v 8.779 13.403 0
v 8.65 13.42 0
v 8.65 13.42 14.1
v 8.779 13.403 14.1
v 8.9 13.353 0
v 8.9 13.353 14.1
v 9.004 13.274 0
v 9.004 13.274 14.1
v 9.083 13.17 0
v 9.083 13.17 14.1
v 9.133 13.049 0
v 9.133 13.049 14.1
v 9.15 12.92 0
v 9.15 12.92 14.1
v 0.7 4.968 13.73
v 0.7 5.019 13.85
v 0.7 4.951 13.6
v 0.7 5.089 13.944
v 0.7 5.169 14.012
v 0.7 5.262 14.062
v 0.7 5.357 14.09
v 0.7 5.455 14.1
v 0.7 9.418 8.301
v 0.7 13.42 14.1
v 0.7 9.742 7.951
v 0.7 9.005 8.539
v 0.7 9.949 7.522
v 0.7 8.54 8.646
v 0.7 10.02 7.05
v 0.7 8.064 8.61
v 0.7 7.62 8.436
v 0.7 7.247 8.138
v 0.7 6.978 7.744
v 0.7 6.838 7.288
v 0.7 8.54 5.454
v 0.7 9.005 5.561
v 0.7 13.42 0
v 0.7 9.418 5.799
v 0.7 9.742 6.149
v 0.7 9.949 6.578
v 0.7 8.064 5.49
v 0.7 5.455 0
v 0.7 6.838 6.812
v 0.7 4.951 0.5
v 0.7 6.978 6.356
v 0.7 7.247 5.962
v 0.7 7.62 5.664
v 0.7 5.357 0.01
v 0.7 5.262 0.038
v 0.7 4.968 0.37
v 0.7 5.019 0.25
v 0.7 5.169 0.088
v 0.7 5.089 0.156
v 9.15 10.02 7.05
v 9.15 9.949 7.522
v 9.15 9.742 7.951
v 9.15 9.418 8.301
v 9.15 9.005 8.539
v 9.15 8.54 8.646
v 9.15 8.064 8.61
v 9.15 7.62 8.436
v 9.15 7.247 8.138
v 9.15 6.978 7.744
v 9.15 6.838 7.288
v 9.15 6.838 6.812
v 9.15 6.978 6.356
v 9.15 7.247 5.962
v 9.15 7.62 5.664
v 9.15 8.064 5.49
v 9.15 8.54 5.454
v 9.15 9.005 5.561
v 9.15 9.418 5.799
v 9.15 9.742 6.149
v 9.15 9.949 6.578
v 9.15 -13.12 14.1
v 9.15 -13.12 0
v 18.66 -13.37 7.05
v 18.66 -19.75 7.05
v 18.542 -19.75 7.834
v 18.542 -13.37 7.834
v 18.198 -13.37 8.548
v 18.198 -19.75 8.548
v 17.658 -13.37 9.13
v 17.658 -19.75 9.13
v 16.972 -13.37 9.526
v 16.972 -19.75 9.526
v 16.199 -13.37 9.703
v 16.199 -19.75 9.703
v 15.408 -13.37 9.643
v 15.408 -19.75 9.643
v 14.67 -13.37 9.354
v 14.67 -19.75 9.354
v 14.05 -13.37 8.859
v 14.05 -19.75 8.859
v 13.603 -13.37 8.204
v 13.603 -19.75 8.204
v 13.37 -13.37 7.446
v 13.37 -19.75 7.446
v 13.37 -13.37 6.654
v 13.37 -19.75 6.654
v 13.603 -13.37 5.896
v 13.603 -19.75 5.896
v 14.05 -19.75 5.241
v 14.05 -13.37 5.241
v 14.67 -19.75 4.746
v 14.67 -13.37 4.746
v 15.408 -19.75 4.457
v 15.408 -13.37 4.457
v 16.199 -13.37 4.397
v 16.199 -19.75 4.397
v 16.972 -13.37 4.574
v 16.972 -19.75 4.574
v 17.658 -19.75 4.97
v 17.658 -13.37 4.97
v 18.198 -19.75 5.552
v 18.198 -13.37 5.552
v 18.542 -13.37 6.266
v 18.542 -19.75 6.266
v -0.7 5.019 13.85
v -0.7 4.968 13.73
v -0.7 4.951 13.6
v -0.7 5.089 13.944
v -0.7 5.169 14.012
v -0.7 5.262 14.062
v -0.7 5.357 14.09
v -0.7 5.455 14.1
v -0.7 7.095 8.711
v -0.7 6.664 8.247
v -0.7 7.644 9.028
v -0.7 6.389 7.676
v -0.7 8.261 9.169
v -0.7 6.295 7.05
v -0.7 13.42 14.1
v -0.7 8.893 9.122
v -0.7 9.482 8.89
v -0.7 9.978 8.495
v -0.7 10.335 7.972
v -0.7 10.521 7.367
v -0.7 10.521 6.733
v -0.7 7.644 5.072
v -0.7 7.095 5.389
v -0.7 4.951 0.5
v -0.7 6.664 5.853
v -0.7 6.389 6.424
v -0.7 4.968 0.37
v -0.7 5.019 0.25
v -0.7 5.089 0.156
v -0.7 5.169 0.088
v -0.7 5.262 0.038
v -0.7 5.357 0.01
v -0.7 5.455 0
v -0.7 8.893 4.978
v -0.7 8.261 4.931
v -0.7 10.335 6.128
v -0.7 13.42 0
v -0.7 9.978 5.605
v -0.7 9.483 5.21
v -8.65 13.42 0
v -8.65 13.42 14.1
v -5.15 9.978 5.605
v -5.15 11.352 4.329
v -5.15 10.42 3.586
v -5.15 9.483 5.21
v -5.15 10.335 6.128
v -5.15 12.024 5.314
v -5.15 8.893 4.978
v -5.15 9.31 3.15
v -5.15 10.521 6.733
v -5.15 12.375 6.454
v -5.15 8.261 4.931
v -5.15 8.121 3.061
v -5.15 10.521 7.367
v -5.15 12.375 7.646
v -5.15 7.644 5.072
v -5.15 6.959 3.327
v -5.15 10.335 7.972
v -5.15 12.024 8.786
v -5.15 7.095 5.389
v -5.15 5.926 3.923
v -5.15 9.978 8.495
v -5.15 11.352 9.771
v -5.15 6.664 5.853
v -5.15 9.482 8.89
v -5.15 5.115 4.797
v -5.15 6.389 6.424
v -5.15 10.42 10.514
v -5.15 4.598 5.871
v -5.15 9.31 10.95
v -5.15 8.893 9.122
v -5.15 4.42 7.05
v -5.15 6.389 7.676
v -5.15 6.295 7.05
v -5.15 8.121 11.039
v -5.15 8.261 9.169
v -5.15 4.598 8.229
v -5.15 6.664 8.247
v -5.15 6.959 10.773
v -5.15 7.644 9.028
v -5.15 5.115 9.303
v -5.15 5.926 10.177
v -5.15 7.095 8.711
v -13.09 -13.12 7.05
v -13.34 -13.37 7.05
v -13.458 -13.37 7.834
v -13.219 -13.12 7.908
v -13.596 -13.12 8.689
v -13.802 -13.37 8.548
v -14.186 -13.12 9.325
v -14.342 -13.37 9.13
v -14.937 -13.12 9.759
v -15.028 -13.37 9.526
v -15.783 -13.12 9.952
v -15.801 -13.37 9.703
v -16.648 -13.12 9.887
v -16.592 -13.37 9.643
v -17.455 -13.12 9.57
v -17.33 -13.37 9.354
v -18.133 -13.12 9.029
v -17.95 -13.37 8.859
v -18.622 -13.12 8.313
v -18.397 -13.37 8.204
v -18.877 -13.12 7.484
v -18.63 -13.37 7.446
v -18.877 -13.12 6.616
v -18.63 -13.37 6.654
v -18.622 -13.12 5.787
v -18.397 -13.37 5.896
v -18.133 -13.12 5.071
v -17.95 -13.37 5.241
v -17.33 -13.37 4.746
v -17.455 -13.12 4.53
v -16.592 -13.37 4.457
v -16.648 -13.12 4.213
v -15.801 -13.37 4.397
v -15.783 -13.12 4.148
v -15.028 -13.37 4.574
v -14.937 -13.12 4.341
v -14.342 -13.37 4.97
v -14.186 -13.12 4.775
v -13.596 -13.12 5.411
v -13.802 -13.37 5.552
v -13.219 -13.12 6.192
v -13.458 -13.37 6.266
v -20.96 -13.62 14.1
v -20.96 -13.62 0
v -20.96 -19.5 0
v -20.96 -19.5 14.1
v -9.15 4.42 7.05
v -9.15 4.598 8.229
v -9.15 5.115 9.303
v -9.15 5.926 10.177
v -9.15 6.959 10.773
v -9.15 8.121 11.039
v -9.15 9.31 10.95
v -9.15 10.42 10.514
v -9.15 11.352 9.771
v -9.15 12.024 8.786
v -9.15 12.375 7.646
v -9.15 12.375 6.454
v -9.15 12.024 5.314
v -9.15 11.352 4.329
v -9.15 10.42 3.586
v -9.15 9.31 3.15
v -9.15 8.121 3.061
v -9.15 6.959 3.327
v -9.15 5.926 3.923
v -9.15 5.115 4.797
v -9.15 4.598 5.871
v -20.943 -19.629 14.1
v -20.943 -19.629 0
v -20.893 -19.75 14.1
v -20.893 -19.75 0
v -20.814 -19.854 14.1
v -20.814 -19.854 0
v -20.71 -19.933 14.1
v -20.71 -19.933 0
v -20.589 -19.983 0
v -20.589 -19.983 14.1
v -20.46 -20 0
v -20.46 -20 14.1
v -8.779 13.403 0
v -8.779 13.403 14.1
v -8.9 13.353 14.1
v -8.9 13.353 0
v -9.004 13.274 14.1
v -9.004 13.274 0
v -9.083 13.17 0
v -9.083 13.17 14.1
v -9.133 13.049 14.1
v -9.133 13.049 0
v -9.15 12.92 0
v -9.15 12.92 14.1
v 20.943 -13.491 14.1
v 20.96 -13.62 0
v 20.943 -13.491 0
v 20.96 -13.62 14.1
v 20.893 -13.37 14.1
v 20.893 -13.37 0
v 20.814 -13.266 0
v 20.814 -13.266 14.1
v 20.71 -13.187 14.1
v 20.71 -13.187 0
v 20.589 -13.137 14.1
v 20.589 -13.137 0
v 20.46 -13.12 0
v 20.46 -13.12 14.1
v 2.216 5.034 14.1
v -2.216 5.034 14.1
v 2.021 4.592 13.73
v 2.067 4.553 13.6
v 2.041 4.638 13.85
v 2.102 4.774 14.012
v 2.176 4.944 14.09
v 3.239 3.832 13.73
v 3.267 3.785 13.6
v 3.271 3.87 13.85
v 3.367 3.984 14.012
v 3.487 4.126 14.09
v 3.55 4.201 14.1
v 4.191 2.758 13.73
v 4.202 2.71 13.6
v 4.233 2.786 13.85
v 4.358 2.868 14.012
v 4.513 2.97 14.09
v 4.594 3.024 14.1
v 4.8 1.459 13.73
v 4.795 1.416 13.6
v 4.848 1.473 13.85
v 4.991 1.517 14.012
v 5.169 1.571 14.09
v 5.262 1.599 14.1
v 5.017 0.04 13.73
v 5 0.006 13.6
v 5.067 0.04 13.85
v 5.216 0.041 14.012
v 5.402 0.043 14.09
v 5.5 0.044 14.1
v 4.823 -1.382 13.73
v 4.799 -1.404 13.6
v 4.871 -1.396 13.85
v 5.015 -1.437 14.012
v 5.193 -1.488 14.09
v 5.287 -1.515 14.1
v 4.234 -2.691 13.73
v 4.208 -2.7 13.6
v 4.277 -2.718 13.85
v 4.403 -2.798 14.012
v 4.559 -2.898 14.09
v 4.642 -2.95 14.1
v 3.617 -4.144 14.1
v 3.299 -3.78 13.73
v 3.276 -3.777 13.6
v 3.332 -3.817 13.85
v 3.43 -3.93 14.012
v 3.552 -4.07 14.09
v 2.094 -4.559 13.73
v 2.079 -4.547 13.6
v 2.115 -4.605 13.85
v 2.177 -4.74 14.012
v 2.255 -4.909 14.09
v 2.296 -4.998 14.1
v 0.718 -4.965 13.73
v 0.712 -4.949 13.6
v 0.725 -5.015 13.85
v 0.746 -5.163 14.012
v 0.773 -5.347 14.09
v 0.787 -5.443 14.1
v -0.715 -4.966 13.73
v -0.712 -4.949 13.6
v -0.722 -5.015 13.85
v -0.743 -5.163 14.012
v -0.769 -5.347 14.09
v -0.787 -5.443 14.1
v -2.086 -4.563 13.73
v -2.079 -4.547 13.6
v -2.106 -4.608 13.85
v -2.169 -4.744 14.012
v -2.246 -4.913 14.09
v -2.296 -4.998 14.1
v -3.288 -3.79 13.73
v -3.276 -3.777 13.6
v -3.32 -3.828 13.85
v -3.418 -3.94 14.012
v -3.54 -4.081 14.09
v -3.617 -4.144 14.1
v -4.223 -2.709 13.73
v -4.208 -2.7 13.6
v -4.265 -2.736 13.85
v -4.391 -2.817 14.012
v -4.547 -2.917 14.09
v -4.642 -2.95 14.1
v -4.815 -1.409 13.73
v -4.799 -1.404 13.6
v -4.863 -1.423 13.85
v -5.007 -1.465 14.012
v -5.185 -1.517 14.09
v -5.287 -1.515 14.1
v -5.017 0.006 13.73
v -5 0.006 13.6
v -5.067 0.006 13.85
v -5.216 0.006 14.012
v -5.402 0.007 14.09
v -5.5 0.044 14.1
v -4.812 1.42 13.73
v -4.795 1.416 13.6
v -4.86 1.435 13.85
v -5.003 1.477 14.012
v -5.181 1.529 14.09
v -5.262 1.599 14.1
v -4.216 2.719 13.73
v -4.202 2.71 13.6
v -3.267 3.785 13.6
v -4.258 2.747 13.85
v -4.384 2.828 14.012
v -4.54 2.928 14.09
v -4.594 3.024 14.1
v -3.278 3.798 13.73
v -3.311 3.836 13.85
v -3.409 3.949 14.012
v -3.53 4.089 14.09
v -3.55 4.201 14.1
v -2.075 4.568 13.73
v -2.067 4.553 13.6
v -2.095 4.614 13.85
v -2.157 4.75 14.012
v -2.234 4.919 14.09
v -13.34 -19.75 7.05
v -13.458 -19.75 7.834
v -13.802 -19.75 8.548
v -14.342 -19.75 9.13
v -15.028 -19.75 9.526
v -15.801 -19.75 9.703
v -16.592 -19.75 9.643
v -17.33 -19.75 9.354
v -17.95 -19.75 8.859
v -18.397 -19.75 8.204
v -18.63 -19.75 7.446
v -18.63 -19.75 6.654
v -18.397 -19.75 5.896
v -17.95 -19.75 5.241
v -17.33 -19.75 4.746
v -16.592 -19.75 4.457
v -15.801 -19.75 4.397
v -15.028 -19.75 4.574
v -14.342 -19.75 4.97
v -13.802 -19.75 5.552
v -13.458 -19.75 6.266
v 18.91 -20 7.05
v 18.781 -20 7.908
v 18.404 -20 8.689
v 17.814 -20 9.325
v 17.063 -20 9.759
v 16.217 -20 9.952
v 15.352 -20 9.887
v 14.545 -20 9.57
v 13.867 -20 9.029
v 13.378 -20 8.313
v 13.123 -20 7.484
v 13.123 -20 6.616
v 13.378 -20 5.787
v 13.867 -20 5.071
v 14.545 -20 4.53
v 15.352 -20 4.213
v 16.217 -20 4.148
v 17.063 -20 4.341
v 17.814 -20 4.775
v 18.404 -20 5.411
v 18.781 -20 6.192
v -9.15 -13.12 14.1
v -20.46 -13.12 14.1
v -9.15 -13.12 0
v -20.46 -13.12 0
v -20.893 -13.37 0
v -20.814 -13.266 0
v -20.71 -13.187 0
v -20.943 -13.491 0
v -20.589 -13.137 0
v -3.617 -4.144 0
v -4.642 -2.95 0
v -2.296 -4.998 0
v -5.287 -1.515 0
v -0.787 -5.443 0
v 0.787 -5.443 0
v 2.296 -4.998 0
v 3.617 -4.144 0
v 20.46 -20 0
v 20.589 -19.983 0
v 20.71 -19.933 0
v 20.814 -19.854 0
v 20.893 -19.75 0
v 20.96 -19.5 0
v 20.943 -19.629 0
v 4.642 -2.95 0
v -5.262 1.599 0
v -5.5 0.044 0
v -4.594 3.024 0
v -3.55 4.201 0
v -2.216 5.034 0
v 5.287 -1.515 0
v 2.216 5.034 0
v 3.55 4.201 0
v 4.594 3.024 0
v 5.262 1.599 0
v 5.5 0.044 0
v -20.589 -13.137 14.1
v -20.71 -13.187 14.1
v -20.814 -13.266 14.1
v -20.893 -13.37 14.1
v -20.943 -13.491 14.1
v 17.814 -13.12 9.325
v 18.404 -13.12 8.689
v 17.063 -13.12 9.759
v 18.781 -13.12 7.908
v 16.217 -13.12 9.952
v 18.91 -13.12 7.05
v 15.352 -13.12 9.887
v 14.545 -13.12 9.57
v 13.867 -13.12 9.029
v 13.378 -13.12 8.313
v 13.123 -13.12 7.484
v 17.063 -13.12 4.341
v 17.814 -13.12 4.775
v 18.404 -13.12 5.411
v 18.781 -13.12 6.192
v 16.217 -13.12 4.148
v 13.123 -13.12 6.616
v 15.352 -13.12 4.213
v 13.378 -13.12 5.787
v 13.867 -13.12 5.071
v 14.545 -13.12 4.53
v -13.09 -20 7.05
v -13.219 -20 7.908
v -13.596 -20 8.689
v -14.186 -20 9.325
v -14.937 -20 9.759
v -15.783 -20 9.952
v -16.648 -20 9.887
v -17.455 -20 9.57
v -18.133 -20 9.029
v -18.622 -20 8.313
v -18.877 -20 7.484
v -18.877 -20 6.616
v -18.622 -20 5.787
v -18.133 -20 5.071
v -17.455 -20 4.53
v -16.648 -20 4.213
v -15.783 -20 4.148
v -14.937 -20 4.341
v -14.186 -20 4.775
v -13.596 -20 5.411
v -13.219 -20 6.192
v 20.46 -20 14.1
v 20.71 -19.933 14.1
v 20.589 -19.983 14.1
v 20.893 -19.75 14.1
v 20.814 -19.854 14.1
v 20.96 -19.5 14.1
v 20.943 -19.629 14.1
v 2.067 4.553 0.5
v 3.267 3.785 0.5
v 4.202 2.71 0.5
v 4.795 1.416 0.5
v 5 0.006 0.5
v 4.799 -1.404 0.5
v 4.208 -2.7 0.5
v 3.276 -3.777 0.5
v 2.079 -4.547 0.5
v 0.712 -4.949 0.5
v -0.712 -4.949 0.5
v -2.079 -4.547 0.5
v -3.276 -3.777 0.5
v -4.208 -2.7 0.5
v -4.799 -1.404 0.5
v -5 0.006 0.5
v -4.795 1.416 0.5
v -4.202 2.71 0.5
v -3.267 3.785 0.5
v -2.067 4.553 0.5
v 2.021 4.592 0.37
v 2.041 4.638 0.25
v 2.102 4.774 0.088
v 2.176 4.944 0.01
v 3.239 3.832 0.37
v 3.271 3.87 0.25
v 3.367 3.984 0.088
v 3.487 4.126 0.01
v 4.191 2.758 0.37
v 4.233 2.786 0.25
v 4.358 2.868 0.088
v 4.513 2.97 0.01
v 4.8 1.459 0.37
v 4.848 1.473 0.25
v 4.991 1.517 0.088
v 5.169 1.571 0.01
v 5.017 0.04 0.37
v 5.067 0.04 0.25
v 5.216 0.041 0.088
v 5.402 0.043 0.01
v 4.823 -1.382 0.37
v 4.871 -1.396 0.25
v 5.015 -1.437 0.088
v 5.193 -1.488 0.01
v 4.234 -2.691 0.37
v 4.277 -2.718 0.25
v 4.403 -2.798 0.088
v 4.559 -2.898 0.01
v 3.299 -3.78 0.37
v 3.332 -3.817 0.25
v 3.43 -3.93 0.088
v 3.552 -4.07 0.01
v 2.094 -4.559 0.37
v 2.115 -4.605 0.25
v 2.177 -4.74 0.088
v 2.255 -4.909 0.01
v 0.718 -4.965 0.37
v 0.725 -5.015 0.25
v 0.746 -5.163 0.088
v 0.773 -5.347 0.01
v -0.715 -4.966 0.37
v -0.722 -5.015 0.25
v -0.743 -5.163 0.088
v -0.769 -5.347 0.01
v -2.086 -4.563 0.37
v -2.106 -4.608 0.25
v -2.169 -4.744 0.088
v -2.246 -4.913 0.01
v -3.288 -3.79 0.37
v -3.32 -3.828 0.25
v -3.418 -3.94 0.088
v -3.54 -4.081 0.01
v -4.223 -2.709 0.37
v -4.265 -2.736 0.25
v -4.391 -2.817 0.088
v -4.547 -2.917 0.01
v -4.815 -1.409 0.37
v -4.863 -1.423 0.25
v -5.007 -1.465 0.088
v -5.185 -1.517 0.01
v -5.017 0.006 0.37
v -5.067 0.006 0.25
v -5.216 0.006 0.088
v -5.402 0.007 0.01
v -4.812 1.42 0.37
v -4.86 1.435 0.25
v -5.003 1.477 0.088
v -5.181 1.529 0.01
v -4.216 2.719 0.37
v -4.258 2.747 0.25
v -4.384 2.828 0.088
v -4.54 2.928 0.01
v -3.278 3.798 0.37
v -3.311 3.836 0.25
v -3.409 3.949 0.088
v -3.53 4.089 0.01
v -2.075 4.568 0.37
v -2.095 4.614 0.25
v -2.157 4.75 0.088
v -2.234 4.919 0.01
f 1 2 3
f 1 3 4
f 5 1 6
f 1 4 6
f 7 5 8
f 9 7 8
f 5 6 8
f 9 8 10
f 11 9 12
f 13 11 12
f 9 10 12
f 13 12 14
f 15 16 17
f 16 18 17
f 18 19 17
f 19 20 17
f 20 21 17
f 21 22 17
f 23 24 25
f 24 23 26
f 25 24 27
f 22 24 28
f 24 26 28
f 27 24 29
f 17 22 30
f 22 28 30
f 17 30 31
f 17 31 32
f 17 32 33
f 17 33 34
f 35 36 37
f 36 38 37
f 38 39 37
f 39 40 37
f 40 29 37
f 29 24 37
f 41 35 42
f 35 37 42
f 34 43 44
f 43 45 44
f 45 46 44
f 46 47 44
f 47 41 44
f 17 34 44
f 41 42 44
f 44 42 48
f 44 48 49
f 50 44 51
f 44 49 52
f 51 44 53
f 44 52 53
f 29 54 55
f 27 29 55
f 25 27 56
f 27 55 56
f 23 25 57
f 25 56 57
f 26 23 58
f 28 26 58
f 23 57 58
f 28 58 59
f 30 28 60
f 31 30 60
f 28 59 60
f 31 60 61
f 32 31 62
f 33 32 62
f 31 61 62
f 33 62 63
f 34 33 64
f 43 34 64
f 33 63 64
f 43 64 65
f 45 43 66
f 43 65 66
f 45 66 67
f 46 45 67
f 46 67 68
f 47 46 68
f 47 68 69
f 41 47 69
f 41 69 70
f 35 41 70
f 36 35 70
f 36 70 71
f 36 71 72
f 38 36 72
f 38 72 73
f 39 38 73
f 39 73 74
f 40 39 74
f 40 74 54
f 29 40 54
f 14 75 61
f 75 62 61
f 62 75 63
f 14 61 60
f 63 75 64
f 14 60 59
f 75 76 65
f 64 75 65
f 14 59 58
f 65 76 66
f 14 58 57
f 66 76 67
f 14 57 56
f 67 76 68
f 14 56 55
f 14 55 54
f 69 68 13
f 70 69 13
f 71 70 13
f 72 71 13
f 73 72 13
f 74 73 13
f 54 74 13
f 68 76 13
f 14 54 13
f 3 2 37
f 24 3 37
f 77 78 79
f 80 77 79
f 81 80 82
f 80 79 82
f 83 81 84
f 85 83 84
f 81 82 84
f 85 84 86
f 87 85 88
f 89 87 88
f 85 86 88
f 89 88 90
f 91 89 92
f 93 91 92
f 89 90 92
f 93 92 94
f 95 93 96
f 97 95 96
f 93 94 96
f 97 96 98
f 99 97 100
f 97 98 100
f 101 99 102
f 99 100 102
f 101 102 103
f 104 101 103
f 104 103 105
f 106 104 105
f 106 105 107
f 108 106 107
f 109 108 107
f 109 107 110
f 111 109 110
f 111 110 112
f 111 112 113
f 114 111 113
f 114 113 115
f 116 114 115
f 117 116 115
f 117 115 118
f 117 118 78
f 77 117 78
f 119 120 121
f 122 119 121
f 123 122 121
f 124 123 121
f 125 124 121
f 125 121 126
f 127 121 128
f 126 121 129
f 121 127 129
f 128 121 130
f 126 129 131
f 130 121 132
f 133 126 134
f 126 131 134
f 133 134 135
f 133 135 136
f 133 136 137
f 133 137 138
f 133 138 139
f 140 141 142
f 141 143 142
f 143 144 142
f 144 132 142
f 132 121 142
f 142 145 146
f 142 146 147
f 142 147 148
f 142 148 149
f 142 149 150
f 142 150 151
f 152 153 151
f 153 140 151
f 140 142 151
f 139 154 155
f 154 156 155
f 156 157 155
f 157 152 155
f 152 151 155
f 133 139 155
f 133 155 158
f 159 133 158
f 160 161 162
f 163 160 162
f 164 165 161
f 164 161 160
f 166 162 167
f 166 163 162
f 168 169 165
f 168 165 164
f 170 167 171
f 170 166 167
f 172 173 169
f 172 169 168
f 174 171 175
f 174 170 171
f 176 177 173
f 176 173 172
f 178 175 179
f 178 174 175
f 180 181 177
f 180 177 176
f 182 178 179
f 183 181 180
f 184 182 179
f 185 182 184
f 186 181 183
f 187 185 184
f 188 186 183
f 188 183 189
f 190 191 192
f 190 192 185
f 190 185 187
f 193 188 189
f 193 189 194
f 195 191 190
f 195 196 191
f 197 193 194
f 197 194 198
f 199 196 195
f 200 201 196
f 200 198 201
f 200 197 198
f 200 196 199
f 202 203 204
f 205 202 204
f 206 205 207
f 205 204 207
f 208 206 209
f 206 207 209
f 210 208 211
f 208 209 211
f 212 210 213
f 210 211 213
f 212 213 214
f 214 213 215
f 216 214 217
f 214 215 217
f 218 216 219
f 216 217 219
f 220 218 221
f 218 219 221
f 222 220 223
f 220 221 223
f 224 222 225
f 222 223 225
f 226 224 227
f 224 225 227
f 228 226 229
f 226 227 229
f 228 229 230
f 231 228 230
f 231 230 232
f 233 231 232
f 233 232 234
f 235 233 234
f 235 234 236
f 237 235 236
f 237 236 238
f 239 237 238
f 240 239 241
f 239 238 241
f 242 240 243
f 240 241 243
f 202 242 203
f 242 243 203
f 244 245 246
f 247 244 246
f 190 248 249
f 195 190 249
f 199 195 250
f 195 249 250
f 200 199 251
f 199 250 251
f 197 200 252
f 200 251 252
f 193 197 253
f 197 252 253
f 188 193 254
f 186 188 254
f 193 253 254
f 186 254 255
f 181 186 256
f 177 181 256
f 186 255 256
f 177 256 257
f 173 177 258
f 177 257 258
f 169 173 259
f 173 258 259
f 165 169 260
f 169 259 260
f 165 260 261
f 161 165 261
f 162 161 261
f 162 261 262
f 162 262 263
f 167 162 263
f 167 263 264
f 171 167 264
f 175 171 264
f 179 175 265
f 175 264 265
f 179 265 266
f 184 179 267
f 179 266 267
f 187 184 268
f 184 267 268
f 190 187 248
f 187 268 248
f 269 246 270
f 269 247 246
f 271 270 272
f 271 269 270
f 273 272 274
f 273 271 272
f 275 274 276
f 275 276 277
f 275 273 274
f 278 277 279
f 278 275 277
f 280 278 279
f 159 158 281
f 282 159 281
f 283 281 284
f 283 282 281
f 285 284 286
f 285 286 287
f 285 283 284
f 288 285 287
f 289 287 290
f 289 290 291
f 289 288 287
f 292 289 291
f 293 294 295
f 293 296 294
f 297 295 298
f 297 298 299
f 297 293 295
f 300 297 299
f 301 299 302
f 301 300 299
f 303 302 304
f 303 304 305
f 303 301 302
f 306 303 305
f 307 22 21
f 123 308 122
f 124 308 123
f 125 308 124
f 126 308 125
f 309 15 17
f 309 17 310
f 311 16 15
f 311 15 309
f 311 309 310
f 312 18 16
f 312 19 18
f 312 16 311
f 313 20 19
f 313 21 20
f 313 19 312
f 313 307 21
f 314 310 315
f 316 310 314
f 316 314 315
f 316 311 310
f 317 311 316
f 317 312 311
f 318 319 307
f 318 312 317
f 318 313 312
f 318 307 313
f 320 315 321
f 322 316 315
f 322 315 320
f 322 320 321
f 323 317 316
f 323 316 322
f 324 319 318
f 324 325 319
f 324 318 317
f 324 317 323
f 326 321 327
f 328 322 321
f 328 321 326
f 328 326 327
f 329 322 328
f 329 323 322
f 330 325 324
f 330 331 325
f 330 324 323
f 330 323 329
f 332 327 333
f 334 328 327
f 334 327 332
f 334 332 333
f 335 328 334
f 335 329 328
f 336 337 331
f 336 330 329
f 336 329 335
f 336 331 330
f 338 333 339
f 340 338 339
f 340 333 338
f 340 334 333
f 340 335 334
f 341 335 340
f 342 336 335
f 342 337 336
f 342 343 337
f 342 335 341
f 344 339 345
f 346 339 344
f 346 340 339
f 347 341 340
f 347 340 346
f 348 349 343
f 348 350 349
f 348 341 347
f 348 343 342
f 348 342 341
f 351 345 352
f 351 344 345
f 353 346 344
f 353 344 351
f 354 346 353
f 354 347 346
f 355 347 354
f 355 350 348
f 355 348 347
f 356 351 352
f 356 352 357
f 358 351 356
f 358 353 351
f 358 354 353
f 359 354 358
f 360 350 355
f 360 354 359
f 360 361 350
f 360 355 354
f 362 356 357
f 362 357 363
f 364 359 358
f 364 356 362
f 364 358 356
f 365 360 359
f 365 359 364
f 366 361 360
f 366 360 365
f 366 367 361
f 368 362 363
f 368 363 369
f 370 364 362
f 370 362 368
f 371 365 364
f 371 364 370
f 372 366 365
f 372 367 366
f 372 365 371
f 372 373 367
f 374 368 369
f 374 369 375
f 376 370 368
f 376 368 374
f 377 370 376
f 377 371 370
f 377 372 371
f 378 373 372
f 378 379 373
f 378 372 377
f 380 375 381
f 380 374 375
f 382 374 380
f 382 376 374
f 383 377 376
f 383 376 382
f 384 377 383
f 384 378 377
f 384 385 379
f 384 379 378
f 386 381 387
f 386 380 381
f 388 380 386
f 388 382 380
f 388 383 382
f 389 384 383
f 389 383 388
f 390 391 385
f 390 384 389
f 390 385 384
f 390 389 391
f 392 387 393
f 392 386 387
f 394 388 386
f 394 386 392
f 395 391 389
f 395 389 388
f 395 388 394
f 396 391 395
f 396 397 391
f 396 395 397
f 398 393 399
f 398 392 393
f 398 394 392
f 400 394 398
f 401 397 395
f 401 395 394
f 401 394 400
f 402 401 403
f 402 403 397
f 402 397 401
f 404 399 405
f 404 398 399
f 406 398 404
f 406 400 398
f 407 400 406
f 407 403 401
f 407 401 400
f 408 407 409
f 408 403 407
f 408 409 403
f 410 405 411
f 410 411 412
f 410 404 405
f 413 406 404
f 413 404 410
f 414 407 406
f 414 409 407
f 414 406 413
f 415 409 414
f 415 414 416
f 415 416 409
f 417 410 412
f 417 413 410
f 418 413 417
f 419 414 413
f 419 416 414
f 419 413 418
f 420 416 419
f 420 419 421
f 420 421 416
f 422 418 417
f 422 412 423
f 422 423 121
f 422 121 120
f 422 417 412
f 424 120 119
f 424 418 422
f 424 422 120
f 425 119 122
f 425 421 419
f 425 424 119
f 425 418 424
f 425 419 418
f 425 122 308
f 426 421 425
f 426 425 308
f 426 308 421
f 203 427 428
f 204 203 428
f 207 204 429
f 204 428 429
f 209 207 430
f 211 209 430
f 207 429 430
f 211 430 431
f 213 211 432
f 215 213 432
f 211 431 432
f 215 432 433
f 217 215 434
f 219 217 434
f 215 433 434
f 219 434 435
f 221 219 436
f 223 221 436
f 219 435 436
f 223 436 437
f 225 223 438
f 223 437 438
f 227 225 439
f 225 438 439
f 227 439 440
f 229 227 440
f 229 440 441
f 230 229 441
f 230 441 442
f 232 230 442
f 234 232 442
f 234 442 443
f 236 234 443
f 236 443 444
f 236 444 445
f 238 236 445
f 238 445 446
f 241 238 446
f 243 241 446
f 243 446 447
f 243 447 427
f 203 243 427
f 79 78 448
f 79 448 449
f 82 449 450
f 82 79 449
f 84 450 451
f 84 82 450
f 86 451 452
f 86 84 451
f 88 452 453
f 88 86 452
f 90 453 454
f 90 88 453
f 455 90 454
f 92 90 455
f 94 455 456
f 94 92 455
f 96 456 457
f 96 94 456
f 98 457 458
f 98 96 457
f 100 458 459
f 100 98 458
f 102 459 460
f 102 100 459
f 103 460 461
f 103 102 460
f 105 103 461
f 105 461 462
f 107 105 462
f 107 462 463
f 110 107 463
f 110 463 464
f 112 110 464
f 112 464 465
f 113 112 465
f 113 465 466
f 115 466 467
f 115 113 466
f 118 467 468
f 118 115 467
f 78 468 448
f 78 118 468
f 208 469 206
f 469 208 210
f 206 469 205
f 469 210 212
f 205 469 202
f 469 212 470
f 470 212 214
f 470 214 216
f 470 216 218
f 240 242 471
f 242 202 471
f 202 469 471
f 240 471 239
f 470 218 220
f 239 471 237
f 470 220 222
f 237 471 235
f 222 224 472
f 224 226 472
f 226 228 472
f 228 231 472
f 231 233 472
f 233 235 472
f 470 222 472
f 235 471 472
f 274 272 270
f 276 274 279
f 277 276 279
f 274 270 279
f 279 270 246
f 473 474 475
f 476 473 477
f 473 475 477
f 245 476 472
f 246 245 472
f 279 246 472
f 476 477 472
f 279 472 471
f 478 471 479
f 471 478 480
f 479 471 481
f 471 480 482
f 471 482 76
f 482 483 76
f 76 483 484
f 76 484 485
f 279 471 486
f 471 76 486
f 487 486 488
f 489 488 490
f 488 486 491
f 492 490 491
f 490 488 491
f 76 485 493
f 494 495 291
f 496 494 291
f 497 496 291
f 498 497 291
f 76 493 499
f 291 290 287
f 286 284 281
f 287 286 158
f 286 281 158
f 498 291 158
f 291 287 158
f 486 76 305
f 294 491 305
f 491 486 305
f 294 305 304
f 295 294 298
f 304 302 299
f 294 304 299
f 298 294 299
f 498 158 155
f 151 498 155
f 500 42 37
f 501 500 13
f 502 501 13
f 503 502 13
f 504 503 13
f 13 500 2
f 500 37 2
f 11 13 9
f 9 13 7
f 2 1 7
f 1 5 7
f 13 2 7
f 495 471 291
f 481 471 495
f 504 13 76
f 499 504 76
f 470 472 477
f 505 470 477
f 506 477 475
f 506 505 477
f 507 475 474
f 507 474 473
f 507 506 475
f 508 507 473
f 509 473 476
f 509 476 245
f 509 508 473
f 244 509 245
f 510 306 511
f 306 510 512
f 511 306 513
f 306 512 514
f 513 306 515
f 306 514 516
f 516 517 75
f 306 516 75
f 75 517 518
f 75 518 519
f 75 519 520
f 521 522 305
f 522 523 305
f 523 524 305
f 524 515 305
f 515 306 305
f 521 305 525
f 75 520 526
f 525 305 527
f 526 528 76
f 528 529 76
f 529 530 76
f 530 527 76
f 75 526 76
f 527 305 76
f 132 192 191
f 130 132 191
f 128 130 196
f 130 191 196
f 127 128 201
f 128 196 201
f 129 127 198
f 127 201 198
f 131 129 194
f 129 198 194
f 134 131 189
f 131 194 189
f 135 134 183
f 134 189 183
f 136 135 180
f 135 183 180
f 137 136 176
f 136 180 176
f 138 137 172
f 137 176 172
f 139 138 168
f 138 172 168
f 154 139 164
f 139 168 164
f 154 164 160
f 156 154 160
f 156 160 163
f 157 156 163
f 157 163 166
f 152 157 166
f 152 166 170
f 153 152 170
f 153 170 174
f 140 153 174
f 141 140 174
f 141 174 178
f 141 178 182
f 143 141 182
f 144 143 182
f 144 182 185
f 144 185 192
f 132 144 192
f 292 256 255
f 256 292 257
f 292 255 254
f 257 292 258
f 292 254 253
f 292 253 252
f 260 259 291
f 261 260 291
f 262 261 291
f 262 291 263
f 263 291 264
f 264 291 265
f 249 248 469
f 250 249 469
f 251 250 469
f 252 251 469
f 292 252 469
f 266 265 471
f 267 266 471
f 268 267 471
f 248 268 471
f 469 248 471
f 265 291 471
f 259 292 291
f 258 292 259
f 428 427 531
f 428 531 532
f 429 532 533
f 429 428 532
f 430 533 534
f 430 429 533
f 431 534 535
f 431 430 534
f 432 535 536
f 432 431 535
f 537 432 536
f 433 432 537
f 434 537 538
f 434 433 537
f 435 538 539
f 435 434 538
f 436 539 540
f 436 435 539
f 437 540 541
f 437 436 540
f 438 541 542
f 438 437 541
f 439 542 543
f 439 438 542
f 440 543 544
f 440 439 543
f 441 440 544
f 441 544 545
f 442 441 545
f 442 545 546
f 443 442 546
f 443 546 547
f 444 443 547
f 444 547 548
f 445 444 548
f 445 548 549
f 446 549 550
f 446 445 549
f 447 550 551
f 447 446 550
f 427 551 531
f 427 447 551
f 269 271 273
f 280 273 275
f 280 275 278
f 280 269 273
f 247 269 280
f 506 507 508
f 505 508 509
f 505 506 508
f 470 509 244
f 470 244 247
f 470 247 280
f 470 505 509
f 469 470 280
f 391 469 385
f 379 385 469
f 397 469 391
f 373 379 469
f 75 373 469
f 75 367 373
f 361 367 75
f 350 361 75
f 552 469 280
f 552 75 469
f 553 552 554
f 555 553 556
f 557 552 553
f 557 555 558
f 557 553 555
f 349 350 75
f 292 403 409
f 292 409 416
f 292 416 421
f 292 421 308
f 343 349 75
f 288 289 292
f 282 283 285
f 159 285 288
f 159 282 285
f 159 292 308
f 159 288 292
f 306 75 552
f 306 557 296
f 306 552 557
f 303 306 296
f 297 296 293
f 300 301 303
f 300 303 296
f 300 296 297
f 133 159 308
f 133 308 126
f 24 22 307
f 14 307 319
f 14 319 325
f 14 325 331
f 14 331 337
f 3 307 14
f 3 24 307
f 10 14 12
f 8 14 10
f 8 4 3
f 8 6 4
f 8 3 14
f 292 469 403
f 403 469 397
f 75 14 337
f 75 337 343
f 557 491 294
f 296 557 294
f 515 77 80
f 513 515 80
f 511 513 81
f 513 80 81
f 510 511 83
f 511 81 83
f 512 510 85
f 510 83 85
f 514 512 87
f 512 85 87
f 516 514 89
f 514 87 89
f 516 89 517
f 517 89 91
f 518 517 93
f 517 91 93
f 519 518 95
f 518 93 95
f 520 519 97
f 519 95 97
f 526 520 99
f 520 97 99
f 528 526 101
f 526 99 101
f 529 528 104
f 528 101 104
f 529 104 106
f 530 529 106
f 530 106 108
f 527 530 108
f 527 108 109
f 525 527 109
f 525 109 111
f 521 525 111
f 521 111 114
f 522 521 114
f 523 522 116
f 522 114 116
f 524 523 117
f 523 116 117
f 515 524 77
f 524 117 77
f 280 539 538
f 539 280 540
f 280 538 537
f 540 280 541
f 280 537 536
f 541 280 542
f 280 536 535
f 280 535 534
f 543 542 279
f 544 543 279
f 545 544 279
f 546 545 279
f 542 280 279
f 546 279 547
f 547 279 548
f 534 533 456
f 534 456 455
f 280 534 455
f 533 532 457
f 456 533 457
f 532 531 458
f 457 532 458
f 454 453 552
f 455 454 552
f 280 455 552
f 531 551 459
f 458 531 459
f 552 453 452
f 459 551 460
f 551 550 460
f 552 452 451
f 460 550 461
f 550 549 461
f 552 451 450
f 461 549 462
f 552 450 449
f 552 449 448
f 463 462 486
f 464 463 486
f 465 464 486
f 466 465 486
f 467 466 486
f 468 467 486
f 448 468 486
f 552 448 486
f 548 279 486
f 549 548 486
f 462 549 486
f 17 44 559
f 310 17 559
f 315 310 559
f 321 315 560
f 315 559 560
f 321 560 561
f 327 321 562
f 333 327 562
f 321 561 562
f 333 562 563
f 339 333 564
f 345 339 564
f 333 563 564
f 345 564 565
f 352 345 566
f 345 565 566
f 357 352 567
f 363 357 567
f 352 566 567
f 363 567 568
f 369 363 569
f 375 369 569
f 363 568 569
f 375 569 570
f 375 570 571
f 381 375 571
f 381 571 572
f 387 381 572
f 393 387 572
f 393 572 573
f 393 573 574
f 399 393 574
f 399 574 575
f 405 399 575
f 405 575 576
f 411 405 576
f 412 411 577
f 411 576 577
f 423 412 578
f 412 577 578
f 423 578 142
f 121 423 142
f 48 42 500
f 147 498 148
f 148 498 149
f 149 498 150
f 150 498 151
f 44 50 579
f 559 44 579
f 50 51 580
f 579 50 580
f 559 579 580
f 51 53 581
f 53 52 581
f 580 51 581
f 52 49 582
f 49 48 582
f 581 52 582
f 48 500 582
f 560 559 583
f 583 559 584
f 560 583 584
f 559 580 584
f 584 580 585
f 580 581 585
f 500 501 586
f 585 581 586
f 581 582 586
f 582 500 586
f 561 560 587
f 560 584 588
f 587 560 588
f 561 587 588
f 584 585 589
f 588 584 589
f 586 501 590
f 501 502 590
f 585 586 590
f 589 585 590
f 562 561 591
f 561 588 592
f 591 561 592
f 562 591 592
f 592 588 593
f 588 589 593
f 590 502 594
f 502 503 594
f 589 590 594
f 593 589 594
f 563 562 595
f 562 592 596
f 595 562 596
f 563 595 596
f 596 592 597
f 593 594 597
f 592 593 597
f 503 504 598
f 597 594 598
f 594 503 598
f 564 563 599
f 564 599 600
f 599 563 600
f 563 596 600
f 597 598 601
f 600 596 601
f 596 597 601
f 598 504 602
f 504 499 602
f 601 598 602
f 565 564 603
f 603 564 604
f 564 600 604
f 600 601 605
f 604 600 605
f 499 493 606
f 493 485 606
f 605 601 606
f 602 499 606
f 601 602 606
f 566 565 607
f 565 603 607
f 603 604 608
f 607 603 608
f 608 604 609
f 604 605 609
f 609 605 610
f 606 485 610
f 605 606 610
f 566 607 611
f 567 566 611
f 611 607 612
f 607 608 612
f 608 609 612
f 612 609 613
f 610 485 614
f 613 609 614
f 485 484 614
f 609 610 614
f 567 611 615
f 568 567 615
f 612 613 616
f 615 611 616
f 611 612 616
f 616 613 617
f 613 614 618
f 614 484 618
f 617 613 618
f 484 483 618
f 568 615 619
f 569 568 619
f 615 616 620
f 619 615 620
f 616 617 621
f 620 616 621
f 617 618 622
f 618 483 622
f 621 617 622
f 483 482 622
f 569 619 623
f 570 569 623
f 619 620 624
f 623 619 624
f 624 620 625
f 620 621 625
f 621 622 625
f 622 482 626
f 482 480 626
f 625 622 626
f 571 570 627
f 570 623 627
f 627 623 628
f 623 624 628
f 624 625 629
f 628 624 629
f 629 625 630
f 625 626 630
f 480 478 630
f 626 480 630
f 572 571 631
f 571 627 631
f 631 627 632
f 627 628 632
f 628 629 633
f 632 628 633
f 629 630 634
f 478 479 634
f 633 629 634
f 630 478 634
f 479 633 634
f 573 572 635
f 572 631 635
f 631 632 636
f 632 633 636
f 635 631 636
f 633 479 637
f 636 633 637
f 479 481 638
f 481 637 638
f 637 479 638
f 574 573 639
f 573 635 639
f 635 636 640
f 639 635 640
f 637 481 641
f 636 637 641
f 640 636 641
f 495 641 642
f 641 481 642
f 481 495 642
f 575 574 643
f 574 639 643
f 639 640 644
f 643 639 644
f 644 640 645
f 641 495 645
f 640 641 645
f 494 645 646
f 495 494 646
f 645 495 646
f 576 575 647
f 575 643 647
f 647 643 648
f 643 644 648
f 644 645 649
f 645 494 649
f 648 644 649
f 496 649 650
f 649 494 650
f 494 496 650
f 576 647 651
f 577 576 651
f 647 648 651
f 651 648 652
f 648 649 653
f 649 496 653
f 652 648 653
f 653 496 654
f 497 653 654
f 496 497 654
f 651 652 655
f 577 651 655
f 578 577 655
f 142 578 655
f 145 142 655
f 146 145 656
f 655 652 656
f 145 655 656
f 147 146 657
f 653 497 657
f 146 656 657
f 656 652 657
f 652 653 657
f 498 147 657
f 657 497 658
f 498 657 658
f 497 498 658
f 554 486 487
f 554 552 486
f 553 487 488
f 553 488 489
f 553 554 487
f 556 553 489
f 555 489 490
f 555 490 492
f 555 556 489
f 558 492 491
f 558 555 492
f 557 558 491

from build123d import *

# Parameters (mm, degrees)
F1_DEPTH = 14.1
F2_R     = 1.6
F3_DEPTH = 30.111
F4_R     = 4
F5_DEPTH = 4
F6_R     = 2.66
F7_DEPTH = 25
F8_R     = 2.125
F9_DEPTH = 5.85
F10_R    = 0.5
F11_SIZE = 0.25


with BuildPart() as f1:
    # F0 (on Top) → F1 (new body)
    with BuildSketch(Plane.XY):
        with BuildLine():
            ThreePointArc((0.7, 4.9507575178), (0, -5), (-0.7, 4.9507575178))
            Line((-0.7, 4.9507575178), (-0.7, 13.42))
            Line((-0.7, 13.42), (-9.15, 13.42))
            Line((-9.15, 13.42), (-9.15, -13.12))
            Line((-9.15, -13.12), (-20.96, -13.12))
            Line((-20.96, -13.12), (-20.96, -20))
            Line((-20.96, -20), (20.96, -20))
            Line((20.96, -20), (20.96, -13.12))
            Line((20.96, -13.12), (9.15, -13.12))
            Line((9.15, -13.12), (9.15, 13.42))
            Line((9.15, 13.42), (0.7, 13.42))
            Line((0.7, 13.42), (0.7, 4.9507575178))
        make_face()
    extrude(amount=F1_DEPTH)

    # F2 (on face) → F3 (cut, through all)
    with BuildSketch(Plane.YZ.offset(9.15)):
        with Locations((8.42, 7.05)):
            Circle(F2_R)
    extrude(amount=-F3_DEPTH, mode=Mode.SUBTRACT)

    # F4 (on face) → F5 (cut)
    with BuildSketch(Plane(origin=(-9.15, 0, 0), x_dir=(0, -1, 0), z_dir=(-1, 0, 0))):
        with Locations((-8.42, 7.05)):
            Circle(F4_R)
    extrude(amount=-F5_DEPTH, mode=Mode.SUBTRACT)

    # F6 (on face) → F7 (cut)
    with BuildSketch(Plane.XZ.offset(20)):
        with Locations((-16, 7.05)):
            Circle(F6_R)
        with Locations((16, 7.05)):
            Circle(F6_R)
    extrude(amount=-F7_DEPTH, mode=Mode.SUBTRACT)

    # F8 (on face) → F9 (cut, through all)
    with BuildSketch(Plane(origin=(-5.15, 0, 0), x_dir=(0, -1, 0), z_dir=(-1, 0, 0))):
        with Locations((-8.42, 7.05)):
            Circle(F8_R)
    extrude(amount=-F9_DEPTH, mode=Mode.SUBTRACT)

    # F10
    f10_edges = [f1.edges().sort_by_distance(p)[0] for p in [
        (-20.96, -13.12, 7.05),
        (-20.96, -20, 7.05),
        (20.96, -13.12, 7.05),
        (20.96, -20, 7.05),
        (9.15, 13.42, 7.05),
        (-9.15, 13.42, 7.05),
        (0, -5, 14.1),
        (0, -5, 0),
    ]]
    fillet(f10_edges, radius=F10_R)

    # F11
    f11_edges = [f1.edges().sort_by_distance(p)[0] for p in [
        (13.34, -20, 7.05),
        (18.66, -16.56, 7.05),
        (13.34, -13.12, 7.05),
        (-18.66, -20, 7.05),
        (-13.34, -16.56, 7.05),
        (-18.66, -13.12, 7.05),
    ]]
    chamfer(f11_edges, length=F11_SIZE)


solid = f1.part
